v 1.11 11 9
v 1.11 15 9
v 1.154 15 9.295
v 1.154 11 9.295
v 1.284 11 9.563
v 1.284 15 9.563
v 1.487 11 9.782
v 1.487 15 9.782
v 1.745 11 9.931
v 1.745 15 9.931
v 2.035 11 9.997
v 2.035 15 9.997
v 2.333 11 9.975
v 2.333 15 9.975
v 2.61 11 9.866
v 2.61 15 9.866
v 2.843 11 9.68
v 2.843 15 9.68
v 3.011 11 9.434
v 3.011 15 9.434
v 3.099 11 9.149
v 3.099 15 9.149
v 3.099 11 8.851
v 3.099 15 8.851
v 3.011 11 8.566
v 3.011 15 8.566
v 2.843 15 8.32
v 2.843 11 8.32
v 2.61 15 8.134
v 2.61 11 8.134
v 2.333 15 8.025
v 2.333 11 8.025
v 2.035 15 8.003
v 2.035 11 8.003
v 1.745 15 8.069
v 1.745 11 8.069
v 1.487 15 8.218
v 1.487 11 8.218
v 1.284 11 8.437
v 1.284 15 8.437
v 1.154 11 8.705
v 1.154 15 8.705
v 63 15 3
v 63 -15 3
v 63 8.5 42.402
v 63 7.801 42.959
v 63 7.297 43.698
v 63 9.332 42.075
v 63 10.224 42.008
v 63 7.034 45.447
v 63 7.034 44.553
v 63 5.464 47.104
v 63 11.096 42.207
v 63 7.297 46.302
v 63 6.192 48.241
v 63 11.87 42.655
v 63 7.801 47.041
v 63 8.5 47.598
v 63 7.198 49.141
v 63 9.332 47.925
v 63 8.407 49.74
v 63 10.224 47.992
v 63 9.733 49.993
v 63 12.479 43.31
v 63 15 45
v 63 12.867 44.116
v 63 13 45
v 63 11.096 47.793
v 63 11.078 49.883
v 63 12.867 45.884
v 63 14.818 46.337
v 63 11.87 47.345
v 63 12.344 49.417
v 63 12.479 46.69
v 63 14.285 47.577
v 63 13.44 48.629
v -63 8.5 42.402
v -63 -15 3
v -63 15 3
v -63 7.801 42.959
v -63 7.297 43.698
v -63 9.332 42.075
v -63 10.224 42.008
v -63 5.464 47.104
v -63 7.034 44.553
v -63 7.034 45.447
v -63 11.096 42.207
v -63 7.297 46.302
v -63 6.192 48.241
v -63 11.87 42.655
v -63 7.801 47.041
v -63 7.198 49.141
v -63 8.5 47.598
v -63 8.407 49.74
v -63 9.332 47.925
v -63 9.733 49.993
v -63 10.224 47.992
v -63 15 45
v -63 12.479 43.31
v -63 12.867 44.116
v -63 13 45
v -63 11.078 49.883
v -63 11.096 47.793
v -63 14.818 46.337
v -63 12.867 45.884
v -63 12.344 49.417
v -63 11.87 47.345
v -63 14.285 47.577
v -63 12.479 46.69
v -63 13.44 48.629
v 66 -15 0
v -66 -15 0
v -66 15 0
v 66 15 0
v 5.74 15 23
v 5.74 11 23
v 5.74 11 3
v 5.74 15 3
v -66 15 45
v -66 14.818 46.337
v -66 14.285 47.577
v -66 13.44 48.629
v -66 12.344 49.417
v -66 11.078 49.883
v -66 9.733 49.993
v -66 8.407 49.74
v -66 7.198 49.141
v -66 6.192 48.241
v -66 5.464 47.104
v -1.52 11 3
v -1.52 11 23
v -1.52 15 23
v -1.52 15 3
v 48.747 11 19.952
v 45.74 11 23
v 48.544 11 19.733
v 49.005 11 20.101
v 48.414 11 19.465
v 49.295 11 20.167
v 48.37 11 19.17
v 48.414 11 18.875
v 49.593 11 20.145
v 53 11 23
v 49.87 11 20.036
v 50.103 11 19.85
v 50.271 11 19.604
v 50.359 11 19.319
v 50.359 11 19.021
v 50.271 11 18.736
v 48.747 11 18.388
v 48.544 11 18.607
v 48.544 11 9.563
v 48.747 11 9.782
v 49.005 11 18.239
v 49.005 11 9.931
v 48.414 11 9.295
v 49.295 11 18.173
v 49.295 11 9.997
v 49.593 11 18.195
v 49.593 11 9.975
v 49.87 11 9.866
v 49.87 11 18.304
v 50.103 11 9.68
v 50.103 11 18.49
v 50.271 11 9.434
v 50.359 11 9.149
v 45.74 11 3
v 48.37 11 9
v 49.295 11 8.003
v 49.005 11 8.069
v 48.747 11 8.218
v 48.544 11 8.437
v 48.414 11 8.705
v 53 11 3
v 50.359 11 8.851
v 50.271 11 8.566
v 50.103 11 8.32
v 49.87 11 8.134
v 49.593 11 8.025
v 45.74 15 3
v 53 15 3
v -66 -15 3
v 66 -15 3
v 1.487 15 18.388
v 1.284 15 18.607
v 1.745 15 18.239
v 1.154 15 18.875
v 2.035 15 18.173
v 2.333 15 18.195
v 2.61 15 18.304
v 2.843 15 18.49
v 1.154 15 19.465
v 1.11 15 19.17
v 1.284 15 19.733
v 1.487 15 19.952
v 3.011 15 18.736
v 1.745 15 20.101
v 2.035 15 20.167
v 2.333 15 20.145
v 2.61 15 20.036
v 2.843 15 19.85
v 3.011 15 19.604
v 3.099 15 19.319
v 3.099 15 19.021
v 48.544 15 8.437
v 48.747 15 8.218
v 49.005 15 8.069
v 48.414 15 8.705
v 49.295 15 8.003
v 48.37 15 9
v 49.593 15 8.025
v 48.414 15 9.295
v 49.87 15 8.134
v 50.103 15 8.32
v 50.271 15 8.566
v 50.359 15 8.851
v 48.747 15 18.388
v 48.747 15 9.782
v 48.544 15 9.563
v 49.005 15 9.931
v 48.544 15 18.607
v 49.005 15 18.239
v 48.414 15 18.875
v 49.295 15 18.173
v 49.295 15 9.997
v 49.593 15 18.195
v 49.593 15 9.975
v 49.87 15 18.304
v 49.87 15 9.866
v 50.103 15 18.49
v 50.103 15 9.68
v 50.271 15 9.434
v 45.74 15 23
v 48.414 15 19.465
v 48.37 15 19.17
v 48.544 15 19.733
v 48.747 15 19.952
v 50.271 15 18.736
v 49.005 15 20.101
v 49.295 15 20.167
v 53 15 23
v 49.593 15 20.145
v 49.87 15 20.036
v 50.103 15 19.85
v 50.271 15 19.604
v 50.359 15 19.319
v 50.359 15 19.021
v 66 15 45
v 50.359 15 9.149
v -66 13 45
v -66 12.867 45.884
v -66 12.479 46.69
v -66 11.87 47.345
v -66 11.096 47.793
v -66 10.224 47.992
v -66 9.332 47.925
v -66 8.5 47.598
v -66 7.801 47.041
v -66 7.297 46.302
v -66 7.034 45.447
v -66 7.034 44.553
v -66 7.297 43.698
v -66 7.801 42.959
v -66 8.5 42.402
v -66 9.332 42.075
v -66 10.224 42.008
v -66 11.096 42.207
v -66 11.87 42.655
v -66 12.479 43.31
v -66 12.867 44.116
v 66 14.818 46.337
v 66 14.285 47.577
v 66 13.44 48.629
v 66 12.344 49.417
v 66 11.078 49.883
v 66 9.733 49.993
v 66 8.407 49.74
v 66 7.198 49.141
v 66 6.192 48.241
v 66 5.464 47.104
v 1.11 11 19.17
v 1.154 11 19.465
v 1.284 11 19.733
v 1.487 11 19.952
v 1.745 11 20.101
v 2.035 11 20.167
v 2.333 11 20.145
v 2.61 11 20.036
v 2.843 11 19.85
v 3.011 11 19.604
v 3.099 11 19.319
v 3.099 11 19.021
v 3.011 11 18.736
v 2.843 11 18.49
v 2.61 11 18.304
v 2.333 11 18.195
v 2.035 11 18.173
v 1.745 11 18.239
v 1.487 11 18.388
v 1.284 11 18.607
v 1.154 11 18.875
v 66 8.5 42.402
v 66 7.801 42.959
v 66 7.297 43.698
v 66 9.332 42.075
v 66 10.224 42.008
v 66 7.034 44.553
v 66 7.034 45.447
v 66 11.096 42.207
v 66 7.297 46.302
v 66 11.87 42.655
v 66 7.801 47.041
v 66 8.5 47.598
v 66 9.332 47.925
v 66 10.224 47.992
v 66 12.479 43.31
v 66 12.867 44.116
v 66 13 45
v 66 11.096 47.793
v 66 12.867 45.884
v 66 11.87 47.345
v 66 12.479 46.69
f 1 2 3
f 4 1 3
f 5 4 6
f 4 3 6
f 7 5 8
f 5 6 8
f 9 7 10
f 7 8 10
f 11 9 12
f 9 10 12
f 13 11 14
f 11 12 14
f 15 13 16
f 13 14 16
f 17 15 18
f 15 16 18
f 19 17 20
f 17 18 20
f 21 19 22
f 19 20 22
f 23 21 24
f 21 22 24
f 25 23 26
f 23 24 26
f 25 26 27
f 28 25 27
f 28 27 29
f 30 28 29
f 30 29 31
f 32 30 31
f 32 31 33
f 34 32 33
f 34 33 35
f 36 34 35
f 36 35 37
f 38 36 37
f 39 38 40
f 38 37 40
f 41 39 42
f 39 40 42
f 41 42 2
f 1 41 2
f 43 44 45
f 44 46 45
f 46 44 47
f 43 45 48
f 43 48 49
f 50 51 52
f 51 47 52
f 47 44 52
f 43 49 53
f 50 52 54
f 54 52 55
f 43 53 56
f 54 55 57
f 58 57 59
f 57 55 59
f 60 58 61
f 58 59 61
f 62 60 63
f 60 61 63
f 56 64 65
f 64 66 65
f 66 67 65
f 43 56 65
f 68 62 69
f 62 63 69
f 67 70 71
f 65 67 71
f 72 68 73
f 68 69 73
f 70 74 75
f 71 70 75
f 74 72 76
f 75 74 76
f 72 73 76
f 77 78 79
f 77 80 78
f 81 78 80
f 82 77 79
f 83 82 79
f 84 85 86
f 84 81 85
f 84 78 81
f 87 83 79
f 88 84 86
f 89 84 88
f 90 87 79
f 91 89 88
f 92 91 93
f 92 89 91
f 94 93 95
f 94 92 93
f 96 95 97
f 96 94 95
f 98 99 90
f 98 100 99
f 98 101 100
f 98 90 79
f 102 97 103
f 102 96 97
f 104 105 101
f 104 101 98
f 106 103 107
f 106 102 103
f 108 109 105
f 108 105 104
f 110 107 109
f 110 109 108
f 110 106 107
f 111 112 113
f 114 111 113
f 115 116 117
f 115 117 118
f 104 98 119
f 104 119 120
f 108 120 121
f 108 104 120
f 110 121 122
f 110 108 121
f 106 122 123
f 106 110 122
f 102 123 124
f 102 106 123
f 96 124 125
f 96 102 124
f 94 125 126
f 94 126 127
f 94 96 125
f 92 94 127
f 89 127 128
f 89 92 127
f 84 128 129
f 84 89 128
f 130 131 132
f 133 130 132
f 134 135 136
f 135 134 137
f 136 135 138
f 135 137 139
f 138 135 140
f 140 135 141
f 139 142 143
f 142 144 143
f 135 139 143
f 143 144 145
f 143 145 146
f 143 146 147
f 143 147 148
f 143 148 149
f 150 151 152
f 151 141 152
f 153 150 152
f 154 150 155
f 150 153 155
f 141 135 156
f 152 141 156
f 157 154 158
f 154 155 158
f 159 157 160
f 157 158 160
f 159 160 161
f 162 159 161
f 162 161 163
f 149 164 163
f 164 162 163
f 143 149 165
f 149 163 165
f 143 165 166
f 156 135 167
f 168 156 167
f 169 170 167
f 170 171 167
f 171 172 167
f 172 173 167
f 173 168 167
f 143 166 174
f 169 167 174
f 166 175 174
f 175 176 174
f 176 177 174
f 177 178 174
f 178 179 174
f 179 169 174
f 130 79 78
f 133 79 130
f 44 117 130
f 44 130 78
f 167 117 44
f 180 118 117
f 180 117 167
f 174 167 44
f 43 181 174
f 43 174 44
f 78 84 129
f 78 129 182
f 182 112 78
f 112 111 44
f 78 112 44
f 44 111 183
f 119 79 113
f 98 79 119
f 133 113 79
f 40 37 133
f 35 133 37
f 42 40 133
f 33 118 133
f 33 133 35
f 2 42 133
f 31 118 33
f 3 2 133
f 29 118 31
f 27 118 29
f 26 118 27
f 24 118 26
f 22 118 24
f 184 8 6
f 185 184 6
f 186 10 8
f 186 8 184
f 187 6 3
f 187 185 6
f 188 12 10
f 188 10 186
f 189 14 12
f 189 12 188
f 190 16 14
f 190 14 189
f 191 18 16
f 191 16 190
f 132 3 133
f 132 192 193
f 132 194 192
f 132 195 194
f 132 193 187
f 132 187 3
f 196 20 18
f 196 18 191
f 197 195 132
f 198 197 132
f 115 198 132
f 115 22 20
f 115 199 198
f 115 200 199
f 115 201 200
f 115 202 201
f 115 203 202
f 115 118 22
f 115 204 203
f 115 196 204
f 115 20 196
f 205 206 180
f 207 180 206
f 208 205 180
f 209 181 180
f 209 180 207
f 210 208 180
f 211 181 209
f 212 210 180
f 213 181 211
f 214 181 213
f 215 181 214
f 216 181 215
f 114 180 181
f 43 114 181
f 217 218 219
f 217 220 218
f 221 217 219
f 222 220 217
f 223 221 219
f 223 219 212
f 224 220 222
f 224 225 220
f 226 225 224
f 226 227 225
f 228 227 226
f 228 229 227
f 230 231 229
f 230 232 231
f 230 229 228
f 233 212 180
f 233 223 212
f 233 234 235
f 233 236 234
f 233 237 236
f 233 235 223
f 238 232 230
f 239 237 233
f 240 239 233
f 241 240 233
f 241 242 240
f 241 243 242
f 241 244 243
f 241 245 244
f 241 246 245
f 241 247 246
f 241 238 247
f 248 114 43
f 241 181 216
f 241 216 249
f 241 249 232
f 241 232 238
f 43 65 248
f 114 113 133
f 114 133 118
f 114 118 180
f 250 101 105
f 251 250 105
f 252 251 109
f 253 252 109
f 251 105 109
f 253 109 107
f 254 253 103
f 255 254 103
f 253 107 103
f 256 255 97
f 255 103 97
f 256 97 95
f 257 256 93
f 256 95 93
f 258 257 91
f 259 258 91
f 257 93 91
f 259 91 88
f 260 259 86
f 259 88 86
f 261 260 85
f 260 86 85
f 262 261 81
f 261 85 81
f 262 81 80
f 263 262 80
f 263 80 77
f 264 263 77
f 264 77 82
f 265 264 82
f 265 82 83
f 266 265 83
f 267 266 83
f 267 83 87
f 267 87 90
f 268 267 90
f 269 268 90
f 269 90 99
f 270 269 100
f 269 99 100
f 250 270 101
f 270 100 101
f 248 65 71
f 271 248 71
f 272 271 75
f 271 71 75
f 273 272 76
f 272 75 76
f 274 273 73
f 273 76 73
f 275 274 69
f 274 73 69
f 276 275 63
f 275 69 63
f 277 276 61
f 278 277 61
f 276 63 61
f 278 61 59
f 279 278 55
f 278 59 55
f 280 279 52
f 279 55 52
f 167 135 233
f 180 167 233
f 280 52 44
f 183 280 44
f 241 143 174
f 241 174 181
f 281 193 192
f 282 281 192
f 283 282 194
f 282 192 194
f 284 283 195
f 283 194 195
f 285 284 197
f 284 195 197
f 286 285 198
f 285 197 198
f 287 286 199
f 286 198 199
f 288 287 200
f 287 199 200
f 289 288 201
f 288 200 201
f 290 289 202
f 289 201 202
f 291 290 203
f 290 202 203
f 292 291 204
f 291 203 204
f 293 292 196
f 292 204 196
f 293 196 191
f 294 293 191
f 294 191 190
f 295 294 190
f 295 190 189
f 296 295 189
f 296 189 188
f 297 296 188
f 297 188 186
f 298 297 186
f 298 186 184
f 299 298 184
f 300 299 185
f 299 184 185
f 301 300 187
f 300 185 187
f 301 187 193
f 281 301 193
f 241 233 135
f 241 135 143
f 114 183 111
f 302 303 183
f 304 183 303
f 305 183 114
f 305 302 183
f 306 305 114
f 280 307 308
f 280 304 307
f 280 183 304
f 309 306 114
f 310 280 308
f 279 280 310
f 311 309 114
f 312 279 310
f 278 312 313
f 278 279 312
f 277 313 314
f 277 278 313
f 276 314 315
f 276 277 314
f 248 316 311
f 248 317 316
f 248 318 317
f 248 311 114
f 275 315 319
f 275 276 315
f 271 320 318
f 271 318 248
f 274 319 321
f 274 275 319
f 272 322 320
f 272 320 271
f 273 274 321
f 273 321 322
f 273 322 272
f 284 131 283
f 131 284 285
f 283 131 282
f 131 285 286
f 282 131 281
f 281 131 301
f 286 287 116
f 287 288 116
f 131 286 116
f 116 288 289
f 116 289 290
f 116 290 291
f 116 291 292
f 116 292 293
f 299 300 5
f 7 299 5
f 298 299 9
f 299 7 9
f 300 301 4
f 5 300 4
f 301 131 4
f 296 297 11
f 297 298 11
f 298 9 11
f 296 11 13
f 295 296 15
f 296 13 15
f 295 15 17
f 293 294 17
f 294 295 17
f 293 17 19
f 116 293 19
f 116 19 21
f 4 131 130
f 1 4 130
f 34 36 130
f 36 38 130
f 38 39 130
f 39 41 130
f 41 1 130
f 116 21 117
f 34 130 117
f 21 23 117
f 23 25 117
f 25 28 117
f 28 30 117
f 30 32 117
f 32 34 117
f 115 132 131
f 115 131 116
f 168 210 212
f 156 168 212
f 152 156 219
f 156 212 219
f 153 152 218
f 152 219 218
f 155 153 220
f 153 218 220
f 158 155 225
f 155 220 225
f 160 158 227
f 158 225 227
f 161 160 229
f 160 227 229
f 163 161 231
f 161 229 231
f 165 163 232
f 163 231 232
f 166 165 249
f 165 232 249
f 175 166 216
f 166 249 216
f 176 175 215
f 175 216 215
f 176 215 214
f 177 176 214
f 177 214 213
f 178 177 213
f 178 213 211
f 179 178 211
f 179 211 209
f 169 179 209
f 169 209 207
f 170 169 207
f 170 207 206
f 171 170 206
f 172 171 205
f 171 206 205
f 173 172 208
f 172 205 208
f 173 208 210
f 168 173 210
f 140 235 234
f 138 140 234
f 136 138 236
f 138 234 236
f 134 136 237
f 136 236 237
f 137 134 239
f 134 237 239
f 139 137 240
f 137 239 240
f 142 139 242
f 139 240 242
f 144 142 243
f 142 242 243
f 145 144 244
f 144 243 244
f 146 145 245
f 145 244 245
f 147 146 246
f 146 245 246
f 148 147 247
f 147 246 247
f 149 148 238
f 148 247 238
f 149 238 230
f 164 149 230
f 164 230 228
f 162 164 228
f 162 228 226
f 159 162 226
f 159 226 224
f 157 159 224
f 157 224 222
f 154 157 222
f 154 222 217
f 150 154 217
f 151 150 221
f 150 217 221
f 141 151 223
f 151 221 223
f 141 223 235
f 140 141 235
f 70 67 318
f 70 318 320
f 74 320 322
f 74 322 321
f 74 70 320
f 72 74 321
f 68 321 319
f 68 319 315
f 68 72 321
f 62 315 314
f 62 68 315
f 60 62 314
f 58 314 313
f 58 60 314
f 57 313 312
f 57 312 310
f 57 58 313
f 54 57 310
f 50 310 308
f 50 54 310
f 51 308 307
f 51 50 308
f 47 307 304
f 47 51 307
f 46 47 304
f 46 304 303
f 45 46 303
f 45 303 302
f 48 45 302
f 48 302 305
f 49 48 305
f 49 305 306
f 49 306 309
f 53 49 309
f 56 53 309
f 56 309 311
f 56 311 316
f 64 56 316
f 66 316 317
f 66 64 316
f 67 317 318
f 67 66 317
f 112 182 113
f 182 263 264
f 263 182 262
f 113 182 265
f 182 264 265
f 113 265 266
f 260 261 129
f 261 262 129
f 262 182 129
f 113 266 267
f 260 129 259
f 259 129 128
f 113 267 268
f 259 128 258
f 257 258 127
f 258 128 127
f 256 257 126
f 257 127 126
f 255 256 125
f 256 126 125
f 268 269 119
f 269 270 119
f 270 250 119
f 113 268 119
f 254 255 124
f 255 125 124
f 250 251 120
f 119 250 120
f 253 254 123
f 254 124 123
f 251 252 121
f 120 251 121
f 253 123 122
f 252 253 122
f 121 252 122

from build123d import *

# Parameters (mm, degrees)
F0_W     = 126
F0_H     = 30
F1_DEPTH = 3
F2_R     = 3
F2_W     = 30
F2_H     = 3
F3_DEPTH = 3
F4_W     = 7.26
F4_H     = 4
F5_DEPTH = 20
F6_R     = 1
F7_DEPTH = 4


# Not quite as in the source:
# - a pattern or mirror of a feature is missing from the dataset's text; its kind, count and spacing are read off the source's solid


with BuildPart() as f1:
    # F0 (on Top) → F1 (new body)
    with BuildSketch(Plane.XY):
        Rectangle(F0_W, F0_H)
    extrude(amount=F1_DEPTH)

    # F2 (on face) → F3 (join)
    with BuildSketch(Plane.YZ.offset(63)):
        with BuildLine():
            Line((-15, 3), (15, 3))
            Line((15, 3), (15, 45))
            ThreePointArc((15, 45), (11.0775660253, 49.8825046299), (5.4644594156, 47.1044884431))
            Line((5.4644594156, 47.1044884431), (-15, 3))
        make_face()
        with Locations((10, 45)):
            Circle(F2_R, mode=Mode.SUBTRACT)
        with Locations((0, 1.5)):
            Rectangle(F2_W, F2_H)
    f3 = extrude(amount=F3_DEPTH)

    # F3_copies: F3 across plane
    add(f3.mirror(Plane(origin=(0, 0, 0), x_dir=(0, 0, -1), z_dir=(-1, 0, 0))))

    # F4 (on face) → F5 (join)
    with BuildSketch(Plane.XY.offset(3)):
        with Locations((2.11, 13)):
            Rectangle(F4_W, F4_H)
        with Locations((49.37, 13)):
            Rectangle(F4_W, F4_H)
    extrude(amount=F5_DEPTH)

    # F6 (on face) → F7 (cut, through all)
    with BuildSketch(Plane(origin=(0, 15, 0), x_dir=(-1, 0, 0), z_dir=(0, 1, 0))):
        with Locations((-49.37, 19.17)):
            Circle(F6_R)
        with Locations((-49.37, 9)):
            Circle(F6_R)
        with Locations((-2.11, 19.17)):
            Circle(F6_R)
        with Locations((-2.11, 9)):
            Circle(F6_R)
    extrude(amount=-F7_DEPTH, mode=Mode.SUBTRACT)


solid = f1.part
